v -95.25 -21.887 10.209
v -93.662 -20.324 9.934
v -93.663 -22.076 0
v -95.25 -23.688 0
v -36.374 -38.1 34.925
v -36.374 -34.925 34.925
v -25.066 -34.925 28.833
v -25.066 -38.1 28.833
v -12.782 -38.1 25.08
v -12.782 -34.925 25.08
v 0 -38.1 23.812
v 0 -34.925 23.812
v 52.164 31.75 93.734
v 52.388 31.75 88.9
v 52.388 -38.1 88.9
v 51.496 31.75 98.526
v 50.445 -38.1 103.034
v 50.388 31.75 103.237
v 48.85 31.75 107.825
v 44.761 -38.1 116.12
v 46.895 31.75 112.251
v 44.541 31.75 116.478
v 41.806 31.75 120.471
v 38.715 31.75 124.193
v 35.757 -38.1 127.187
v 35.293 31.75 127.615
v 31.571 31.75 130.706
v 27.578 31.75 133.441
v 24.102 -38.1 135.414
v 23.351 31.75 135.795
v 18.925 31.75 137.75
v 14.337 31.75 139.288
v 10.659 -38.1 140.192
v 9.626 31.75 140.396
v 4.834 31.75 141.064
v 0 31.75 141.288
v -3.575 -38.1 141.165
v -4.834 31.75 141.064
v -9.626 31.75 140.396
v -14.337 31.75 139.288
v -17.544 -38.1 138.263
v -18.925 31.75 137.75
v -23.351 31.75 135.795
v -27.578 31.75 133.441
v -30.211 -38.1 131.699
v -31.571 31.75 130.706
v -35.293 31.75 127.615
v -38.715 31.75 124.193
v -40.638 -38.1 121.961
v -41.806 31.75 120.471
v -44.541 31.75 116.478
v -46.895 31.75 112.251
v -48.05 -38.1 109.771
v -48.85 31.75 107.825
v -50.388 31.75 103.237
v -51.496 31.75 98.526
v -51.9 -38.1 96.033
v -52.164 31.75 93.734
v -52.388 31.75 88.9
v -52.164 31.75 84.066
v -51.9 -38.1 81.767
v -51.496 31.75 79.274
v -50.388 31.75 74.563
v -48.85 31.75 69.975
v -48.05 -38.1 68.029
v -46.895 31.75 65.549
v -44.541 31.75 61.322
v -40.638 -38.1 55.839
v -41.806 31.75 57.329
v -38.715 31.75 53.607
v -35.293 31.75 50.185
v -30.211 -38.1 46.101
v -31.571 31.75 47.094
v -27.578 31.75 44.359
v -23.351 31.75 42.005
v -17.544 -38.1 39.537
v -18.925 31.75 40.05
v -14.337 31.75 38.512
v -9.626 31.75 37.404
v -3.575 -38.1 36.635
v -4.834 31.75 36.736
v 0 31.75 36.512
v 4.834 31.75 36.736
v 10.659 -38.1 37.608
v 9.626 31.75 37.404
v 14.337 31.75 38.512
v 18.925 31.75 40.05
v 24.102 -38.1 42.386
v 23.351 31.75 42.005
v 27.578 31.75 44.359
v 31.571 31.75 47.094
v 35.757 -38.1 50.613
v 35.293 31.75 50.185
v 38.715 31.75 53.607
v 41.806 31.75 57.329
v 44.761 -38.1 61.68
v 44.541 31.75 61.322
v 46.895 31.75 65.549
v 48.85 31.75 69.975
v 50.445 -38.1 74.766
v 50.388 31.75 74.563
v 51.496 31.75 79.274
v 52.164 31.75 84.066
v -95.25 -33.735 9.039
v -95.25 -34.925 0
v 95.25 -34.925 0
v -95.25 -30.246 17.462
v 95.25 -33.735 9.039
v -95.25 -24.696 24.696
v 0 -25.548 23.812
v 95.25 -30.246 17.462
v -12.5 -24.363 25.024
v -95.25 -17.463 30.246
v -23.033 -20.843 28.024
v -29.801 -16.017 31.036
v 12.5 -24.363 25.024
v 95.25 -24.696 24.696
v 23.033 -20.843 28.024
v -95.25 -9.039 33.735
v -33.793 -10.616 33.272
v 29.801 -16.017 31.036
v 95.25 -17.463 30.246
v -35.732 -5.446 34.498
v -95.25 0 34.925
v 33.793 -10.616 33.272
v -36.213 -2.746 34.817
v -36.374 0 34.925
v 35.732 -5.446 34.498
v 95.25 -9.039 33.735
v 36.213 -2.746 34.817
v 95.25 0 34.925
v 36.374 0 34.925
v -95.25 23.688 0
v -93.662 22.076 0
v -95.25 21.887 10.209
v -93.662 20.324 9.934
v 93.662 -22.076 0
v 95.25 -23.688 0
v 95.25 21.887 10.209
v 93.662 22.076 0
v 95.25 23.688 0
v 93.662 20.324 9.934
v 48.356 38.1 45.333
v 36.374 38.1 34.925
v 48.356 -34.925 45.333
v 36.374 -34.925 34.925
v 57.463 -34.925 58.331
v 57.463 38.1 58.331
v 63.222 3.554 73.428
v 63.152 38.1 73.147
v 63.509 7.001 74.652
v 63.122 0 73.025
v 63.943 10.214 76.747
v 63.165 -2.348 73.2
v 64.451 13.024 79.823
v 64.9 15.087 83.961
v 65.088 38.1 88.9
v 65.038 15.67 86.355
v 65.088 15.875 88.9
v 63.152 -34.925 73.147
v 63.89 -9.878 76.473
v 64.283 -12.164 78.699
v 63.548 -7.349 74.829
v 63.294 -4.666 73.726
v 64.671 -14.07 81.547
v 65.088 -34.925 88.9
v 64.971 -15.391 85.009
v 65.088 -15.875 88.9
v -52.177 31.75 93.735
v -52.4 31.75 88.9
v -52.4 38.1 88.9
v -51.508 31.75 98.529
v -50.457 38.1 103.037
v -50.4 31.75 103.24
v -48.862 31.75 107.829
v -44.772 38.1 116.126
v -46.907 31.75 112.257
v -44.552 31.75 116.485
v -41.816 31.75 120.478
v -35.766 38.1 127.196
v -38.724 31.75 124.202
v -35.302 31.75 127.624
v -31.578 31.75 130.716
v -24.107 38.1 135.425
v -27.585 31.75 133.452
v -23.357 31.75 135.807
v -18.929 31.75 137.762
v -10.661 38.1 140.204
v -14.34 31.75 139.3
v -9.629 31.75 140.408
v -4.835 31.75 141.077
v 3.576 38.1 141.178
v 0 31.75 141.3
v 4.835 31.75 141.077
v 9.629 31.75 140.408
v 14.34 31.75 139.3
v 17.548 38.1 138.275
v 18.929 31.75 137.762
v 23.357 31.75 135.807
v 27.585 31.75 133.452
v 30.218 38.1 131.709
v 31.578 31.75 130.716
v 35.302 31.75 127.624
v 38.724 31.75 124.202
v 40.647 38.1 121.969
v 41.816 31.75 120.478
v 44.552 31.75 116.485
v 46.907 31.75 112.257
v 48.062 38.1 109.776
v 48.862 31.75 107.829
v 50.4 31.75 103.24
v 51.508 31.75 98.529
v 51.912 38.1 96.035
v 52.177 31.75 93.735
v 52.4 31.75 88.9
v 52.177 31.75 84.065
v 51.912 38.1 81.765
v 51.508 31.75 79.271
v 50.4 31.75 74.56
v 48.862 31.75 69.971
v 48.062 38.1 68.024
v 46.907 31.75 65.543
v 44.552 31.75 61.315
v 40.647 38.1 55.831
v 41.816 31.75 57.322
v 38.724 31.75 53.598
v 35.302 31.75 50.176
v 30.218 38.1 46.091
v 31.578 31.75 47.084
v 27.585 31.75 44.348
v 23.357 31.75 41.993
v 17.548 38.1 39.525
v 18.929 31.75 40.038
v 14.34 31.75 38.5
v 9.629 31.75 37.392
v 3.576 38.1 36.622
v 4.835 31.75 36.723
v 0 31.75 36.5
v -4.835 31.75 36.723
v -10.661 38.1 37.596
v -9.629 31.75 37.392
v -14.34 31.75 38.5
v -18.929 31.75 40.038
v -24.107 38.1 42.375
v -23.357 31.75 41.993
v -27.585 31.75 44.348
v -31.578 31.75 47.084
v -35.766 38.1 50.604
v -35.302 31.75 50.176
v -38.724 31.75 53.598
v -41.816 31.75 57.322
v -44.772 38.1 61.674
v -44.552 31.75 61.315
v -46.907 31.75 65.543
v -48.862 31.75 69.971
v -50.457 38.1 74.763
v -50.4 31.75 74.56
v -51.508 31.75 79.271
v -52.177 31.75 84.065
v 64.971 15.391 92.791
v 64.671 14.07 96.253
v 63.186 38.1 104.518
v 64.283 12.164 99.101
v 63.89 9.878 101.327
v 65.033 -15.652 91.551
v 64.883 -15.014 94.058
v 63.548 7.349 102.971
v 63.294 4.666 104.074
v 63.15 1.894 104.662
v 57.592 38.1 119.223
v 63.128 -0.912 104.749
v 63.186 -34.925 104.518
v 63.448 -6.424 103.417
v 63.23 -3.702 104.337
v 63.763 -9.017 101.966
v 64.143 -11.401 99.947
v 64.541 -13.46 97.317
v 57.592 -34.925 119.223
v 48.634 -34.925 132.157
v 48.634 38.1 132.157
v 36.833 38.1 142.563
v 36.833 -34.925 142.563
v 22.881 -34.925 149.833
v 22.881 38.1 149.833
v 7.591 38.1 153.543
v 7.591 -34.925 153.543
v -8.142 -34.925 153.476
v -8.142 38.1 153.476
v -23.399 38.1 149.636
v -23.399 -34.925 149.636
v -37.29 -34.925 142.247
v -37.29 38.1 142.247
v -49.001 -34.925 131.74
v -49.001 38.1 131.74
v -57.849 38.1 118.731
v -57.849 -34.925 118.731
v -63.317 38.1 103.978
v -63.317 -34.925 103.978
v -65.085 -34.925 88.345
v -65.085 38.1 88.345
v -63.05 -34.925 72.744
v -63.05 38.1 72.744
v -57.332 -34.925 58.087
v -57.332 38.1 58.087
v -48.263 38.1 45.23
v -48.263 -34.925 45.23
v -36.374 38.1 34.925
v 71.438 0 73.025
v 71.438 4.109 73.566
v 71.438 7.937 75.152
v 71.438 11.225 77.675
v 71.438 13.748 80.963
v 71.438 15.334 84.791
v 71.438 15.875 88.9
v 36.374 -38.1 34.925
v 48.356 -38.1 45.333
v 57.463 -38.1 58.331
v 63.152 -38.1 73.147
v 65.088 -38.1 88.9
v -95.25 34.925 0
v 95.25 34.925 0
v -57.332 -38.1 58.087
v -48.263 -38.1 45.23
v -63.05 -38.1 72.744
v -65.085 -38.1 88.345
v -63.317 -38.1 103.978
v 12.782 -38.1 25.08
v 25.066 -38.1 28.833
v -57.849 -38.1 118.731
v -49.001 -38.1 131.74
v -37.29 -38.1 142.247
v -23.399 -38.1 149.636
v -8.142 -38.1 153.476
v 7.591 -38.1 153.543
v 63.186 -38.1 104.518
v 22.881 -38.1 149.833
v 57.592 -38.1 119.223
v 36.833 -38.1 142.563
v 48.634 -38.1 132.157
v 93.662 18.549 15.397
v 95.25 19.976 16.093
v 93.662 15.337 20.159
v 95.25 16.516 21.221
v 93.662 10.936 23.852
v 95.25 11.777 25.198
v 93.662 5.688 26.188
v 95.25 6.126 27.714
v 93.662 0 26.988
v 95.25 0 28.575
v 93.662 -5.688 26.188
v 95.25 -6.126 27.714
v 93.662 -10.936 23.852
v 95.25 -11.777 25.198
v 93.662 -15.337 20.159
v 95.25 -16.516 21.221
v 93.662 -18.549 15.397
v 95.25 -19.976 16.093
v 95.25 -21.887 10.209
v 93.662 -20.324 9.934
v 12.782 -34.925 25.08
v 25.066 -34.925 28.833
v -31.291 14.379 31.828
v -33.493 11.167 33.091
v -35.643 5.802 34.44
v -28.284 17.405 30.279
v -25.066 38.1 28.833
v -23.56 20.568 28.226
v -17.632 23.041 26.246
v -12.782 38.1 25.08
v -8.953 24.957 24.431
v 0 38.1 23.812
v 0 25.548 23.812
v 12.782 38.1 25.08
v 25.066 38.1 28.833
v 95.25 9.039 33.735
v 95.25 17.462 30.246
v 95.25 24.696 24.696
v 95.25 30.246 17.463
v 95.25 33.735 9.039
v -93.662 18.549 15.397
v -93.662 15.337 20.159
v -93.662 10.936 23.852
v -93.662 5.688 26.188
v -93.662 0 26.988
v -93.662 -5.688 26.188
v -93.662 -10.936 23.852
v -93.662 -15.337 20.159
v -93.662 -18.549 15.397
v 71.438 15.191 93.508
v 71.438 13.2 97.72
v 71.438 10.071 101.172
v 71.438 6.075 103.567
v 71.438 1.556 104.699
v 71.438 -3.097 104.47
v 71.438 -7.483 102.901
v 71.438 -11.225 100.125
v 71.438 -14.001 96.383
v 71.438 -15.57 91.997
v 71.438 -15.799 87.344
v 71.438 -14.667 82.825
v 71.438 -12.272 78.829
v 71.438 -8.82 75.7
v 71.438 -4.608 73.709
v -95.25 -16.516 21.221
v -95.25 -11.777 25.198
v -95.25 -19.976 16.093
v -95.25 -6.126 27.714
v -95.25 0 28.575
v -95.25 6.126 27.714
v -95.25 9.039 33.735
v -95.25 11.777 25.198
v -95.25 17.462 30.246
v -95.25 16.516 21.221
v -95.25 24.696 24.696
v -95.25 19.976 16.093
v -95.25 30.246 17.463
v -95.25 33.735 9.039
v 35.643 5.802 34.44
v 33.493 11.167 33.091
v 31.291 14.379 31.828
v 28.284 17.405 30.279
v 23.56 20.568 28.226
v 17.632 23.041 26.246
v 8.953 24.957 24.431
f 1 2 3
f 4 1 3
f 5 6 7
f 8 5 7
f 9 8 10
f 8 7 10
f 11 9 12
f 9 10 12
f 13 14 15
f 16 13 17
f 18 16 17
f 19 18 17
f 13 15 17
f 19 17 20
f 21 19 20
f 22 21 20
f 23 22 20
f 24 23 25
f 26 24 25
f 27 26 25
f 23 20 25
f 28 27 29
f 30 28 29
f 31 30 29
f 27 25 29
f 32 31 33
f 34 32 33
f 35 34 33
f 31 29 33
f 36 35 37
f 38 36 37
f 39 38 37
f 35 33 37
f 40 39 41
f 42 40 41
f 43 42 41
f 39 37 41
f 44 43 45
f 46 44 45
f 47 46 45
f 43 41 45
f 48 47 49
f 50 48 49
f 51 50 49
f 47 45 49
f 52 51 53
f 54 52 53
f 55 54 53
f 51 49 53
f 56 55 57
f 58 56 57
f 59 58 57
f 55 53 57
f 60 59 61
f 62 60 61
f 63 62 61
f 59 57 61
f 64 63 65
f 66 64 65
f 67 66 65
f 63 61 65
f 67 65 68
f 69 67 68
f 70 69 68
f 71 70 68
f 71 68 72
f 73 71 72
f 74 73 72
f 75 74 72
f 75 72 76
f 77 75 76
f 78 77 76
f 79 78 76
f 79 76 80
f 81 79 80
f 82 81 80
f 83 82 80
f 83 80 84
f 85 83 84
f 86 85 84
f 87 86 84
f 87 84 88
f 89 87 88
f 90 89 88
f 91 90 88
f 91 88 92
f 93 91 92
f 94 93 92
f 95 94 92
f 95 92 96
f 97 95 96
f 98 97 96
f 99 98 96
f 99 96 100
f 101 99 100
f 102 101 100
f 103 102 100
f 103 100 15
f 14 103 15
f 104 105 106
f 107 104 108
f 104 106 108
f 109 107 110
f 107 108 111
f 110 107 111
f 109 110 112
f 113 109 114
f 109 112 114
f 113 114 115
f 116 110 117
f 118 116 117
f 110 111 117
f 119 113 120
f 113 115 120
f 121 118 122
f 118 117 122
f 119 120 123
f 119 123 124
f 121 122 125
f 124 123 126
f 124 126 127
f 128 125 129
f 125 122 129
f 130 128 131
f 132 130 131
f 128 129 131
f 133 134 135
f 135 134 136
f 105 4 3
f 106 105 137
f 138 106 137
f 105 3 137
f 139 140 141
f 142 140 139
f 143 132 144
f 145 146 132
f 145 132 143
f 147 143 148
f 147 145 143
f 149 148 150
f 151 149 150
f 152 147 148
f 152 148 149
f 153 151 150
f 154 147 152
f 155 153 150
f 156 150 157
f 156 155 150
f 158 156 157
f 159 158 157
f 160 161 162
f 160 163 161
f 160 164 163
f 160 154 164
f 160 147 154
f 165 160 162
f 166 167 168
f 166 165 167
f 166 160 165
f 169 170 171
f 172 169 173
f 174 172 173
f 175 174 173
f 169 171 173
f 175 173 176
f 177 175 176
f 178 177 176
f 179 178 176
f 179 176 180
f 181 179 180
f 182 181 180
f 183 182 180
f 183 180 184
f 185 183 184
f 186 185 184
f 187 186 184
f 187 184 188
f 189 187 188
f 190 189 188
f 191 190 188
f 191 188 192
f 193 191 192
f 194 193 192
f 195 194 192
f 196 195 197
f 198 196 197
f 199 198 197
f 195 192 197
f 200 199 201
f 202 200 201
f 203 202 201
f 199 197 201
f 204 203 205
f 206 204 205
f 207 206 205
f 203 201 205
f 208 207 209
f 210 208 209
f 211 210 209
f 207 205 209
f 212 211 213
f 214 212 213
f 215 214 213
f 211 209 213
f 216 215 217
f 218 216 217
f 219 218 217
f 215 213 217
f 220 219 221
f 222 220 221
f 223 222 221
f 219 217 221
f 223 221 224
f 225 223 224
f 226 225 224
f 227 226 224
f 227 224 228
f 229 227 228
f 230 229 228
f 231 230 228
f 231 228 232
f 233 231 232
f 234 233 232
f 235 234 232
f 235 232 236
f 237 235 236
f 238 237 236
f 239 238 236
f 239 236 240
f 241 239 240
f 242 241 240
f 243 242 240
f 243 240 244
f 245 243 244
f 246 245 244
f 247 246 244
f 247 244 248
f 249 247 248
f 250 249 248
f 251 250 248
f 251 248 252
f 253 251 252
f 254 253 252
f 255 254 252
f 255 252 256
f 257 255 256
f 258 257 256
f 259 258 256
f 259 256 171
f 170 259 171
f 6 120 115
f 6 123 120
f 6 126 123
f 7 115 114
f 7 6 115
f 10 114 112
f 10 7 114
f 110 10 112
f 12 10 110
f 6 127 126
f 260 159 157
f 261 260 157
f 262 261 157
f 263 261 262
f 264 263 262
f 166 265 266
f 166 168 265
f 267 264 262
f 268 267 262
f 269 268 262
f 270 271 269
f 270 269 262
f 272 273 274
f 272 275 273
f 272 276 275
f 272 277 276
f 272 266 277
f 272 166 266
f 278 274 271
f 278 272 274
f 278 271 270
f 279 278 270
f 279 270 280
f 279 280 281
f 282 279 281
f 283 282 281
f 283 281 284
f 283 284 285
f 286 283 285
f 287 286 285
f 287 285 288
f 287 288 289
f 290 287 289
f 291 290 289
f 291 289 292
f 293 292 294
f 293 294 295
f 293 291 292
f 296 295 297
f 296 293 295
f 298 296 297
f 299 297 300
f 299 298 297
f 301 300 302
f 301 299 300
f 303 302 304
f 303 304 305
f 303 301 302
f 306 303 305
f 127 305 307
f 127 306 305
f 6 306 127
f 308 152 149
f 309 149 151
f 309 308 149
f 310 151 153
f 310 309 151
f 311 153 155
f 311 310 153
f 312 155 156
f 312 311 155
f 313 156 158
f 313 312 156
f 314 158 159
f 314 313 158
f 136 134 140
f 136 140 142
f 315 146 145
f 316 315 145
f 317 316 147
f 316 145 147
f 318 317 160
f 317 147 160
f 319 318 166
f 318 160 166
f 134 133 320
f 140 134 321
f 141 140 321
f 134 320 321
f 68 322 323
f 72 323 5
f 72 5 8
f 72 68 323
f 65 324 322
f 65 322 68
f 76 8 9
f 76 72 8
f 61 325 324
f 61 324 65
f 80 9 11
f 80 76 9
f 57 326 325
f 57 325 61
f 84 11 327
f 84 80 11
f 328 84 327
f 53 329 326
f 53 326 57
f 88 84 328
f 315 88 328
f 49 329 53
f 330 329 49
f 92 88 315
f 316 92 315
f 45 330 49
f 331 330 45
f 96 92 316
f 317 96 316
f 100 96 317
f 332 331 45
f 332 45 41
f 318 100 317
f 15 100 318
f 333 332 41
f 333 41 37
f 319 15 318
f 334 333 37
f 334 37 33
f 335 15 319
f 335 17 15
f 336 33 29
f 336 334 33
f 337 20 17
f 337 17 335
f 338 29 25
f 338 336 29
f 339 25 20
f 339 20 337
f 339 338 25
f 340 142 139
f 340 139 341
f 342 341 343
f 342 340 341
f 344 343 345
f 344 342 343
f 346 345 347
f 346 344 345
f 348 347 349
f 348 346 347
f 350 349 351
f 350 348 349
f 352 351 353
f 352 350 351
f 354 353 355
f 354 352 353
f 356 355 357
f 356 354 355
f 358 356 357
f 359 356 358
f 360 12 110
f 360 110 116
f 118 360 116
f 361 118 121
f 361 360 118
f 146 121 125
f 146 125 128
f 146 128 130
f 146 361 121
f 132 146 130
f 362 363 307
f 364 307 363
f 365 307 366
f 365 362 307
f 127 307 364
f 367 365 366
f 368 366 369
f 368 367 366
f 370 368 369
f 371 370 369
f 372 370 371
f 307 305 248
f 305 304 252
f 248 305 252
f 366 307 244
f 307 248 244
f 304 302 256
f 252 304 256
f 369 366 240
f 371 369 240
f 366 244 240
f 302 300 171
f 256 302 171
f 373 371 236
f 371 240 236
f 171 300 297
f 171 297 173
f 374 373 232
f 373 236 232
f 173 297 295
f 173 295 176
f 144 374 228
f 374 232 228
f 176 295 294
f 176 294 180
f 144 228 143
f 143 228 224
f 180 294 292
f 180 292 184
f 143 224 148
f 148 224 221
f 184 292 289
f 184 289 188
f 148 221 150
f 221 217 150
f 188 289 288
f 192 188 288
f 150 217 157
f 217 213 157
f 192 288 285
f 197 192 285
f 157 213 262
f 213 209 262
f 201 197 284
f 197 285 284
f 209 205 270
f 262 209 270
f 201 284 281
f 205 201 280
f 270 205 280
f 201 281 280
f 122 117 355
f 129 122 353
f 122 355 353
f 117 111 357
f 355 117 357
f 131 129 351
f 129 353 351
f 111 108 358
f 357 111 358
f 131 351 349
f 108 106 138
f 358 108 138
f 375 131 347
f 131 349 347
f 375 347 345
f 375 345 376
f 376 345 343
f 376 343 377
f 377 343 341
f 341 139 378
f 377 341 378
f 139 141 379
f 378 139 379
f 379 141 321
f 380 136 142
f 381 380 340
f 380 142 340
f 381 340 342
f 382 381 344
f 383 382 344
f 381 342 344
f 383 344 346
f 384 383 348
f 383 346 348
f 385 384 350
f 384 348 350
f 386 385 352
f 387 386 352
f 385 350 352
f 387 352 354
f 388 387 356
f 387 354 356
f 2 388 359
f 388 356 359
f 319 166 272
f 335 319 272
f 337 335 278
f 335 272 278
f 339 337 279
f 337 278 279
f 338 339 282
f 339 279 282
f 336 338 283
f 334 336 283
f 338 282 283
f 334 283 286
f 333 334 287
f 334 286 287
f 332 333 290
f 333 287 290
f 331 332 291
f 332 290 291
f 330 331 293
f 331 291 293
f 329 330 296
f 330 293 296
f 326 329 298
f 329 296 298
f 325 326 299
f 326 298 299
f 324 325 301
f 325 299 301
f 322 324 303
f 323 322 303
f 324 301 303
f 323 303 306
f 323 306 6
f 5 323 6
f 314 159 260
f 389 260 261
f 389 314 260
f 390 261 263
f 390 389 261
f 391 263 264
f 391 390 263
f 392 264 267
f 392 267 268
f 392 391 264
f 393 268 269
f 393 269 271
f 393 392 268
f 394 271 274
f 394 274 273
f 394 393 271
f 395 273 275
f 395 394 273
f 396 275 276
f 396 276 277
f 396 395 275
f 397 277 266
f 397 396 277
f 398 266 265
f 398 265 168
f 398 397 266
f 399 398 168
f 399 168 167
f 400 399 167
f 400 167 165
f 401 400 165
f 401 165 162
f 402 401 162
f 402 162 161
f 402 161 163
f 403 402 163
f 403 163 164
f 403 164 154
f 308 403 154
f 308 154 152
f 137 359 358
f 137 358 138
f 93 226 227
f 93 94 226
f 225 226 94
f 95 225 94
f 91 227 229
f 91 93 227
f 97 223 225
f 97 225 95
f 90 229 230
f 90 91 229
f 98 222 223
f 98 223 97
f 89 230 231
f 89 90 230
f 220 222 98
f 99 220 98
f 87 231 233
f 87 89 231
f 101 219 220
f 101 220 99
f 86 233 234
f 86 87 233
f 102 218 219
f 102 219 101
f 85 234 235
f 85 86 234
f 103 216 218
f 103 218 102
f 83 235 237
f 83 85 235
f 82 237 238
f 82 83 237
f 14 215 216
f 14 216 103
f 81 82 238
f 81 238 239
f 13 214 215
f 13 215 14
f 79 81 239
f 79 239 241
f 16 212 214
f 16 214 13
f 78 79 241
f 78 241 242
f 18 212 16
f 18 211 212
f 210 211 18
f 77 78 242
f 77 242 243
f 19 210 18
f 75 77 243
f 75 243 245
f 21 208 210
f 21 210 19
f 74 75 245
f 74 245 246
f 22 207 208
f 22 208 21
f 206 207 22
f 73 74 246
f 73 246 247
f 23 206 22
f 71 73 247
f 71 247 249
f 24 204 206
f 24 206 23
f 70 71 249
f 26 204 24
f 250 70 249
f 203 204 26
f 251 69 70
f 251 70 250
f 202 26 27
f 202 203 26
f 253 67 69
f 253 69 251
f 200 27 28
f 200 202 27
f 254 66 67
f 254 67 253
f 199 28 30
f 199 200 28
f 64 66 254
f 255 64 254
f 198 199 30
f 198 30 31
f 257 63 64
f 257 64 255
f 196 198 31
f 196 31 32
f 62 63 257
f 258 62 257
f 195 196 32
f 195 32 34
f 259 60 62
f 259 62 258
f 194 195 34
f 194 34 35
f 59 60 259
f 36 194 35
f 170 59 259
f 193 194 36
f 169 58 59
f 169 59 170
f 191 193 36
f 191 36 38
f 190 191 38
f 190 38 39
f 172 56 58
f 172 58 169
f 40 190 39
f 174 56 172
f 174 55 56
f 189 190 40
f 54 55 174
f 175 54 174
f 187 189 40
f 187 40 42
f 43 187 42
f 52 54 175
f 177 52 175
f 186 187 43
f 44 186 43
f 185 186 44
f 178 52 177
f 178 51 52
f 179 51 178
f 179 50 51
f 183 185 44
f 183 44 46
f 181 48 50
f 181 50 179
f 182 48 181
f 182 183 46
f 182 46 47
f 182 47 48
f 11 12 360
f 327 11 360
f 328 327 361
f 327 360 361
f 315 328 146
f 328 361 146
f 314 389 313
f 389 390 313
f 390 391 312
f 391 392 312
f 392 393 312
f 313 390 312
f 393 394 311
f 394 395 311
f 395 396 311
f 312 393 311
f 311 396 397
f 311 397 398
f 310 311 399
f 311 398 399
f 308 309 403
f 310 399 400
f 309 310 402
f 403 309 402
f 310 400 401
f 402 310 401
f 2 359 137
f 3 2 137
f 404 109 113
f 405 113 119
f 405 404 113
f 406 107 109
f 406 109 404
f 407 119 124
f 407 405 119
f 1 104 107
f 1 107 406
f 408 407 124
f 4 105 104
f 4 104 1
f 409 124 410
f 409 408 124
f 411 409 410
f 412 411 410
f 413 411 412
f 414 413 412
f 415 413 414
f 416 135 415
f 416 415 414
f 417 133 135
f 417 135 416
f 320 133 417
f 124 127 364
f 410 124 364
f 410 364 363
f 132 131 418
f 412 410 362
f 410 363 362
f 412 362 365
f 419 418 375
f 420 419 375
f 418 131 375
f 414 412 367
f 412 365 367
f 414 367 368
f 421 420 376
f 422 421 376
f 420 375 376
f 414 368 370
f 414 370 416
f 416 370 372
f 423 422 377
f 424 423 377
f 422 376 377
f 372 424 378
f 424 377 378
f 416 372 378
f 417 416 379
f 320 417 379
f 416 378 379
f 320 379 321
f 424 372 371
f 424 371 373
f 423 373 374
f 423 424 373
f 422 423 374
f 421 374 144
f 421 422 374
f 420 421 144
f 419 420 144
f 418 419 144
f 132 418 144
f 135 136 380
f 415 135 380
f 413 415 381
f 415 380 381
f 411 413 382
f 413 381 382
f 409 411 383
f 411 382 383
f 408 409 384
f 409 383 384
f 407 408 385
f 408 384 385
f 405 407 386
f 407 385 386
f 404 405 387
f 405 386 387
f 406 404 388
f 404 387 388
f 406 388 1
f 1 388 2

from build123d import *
from build123d import SkipClean  # not in build123d's __all__

# Parameters (mm, degrees)
F0_W            = 190.5
F0_H            = 69.85
F1_DEPTH        = 34.925
F4_DEPTH        = 190.5
F5_DEPTH        = 73.025
F6_DEPTH        = 3.175
F9_DEPTH        = 190.5010001
F10_SIZE2       = 1.5875
F10_SIZE        = 1.5875
F14_DEPTH       = 36.64824
F16_DEPTH       = 83.54939
F17_D           = 104.775
F17_CBORE_D     = 104.8004
F17_CBORE_DEPTH = 6.35


with BuildPart() as f1:
    # F0 (on Top) → F1 (new body)
    with BuildSketch(Plane.XY):
        Rectangle(F0_W, F0_H)
    extrude(amount=F1_DEPTH)

    # F2 (on face) → F4 (cut)
    with BuildSketch(Plane.YZ.offset(95.25)):
        with BuildLine():
            Line((-34.925, 34.925), (-34.925, 0))
            ThreePointArc((-34.925, 0), (-24.6957043451, 24.6957043208), (-3.45e-08, 34.925))
            Line((-3.45e-08, 34.925), (-34.925, 34.925))
        make_face()
        with BuildLine():
            ThreePointArc((-3.45e-08, 34.925), (24.6957043208, 24.6957043451), (34.925, 0))
            Line((34.925, 0), (34.925, 34.925))
            Line((34.925, 34.925), (-3.45e-08, 34.925))
        make_face()
    extrude(amount=-F4_DEPTH, mode=Mode.SUBTRACT)

    # F3 (on face) → F5 (join)
    with BuildSketch(Plane.XZ.offset(34.925)):
        with BuildLine():
            Line((-36.3741945787, 34.925), (0, 34.925))
            Line((0, 34.925), (36.3741945787, 34.925))
            ThreePointArc((36.3741945787, 34.925), (57.462544522, 58.3314110024), (65.0875, 88.9))
            ThreePointArc((65.0875, 88.9), (-30.5685889976, 146.362544522), (-36.3741945787, 34.925))
        make_face()
        with BuildLine():
            Line((0, 34.925), (0, 23.8125))
            ThreePointArc((0, 23.8125), (19.0168983243, 26.6525885327), (36.3741945787, 34.925))
            Line((36.3741945787, 34.925), (0, 34.925))
        make_face()
        with BuildLine():
            ThreePointArc((-36.3741945787, 34.925), (-19.0168983243, 26.6525885327), (0, 23.8125))
            Line((0, 23.8125), (0, 34.925))
            Line((0, 34.925), (-36.3741945787, 34.925))
        make_face()
    with SkipClean():  # cleaning this boolean's faces spoils the solid; the shape is the same uncleaned
        extrude(amount=-F5_DEPTH)

    # F6 (add): a face of the model
    f6_faces = [f1.faces().sort_by_distance(p)[0] for p in [
        (0, -34.925, 88.9),
    ]]
    with SkipClean():  # cleaning this boolean's faces spoils the solid; the shape is the same uncleaned
        extrude(f6_faces, amount=F6_DEPTH)

    # F8 (on face) → F9 (cut, through all)
    with BuildSketch(Plane.YZ.offset(95.25)):
        with BuildLine():
            Line((22.0755430303, 0), (20.3239700028, 9.9336642666))
            ThreePointArc((20.3239700028, 9.9336642666), (0, 26.9875), (-20.3239700028, 9.9336642666))
            Line((-20.3239700028, 9.9336642666), (-22.0755430303, 0))
            Line((-22.0755430303, 0), (0, 0))
            Line((0, 0), (22.0755430303, 0))
        make_face()
    with SkipClean():  # cleaning this boolean's faces spoils the solid; the shape is the same uncleaned
        extrude(amount=-F9_DEPTH, mode=Mode.SUBTRACT)

    # F10
    f10_edges = [f1.edges().sort_by_distance(p)[0] for p in [
        (95.25, 0, 26.9875),
        (95.25, 21.199757, 4.966832),
        (95.25, -21.199757, 4.966832),
        (-95.25, 0, 26.9875),
        (-95.25, -21.199757, 4.966832),
        (-95.25, 21.199757, 4.966832),
    ]]
    chamfer(f10_edges, length=F10_SIZE, length2=F10_SIZE2)

    # F13 (on face) → F14 (join)
    with BuildSketch(Plane.YZ.offset(95.25)):
        with BuildLine():
            ThreePointArc((15.875, 88.9), (-11.2253201513, 100.1253201513), (0, 73.025))
            ThreePointArc((0, 73.025), (11.2253201513, 77.6746798487), (15.875, 88.9))
        make_face()
    with SkipClean():  # cleaning this boolean's faces spoils the solid; the shape is the same uncleaned
        extrude(amount=-F14_DEPTH)

    # F15 (on face) → F16 (cut)
    with BuildSketch(Plane.XZ.offset(38.1)):
        Polygon((71.4375, 107.923515141), (71.4375, 88.9), (71.4375, 69.2154169083), (71.4375, 68.7513798475), (104.9063950777, 68.7513798475), (104.9063950777, 107.923515141), align=None)
    with SkipClean():  # cleaning this boolean's faces spoils the solid; the shape is the same uncleaned
        extrude(amount=-F16_DEPTH, mode=Mode.SUBTRACT)

    # F17 (through all)
    with Locations(Plane(origin=(0, 38.1, 0), x_dir=(-1, 0, 0), z_dir=(0, 1, 0))):
        with Locations((0, 88.9)):
            CounterBoreHole(F17_D / 2, F17_CBORE_D / 2, F17_CBORE_DEPTH)


solid = f1.part
